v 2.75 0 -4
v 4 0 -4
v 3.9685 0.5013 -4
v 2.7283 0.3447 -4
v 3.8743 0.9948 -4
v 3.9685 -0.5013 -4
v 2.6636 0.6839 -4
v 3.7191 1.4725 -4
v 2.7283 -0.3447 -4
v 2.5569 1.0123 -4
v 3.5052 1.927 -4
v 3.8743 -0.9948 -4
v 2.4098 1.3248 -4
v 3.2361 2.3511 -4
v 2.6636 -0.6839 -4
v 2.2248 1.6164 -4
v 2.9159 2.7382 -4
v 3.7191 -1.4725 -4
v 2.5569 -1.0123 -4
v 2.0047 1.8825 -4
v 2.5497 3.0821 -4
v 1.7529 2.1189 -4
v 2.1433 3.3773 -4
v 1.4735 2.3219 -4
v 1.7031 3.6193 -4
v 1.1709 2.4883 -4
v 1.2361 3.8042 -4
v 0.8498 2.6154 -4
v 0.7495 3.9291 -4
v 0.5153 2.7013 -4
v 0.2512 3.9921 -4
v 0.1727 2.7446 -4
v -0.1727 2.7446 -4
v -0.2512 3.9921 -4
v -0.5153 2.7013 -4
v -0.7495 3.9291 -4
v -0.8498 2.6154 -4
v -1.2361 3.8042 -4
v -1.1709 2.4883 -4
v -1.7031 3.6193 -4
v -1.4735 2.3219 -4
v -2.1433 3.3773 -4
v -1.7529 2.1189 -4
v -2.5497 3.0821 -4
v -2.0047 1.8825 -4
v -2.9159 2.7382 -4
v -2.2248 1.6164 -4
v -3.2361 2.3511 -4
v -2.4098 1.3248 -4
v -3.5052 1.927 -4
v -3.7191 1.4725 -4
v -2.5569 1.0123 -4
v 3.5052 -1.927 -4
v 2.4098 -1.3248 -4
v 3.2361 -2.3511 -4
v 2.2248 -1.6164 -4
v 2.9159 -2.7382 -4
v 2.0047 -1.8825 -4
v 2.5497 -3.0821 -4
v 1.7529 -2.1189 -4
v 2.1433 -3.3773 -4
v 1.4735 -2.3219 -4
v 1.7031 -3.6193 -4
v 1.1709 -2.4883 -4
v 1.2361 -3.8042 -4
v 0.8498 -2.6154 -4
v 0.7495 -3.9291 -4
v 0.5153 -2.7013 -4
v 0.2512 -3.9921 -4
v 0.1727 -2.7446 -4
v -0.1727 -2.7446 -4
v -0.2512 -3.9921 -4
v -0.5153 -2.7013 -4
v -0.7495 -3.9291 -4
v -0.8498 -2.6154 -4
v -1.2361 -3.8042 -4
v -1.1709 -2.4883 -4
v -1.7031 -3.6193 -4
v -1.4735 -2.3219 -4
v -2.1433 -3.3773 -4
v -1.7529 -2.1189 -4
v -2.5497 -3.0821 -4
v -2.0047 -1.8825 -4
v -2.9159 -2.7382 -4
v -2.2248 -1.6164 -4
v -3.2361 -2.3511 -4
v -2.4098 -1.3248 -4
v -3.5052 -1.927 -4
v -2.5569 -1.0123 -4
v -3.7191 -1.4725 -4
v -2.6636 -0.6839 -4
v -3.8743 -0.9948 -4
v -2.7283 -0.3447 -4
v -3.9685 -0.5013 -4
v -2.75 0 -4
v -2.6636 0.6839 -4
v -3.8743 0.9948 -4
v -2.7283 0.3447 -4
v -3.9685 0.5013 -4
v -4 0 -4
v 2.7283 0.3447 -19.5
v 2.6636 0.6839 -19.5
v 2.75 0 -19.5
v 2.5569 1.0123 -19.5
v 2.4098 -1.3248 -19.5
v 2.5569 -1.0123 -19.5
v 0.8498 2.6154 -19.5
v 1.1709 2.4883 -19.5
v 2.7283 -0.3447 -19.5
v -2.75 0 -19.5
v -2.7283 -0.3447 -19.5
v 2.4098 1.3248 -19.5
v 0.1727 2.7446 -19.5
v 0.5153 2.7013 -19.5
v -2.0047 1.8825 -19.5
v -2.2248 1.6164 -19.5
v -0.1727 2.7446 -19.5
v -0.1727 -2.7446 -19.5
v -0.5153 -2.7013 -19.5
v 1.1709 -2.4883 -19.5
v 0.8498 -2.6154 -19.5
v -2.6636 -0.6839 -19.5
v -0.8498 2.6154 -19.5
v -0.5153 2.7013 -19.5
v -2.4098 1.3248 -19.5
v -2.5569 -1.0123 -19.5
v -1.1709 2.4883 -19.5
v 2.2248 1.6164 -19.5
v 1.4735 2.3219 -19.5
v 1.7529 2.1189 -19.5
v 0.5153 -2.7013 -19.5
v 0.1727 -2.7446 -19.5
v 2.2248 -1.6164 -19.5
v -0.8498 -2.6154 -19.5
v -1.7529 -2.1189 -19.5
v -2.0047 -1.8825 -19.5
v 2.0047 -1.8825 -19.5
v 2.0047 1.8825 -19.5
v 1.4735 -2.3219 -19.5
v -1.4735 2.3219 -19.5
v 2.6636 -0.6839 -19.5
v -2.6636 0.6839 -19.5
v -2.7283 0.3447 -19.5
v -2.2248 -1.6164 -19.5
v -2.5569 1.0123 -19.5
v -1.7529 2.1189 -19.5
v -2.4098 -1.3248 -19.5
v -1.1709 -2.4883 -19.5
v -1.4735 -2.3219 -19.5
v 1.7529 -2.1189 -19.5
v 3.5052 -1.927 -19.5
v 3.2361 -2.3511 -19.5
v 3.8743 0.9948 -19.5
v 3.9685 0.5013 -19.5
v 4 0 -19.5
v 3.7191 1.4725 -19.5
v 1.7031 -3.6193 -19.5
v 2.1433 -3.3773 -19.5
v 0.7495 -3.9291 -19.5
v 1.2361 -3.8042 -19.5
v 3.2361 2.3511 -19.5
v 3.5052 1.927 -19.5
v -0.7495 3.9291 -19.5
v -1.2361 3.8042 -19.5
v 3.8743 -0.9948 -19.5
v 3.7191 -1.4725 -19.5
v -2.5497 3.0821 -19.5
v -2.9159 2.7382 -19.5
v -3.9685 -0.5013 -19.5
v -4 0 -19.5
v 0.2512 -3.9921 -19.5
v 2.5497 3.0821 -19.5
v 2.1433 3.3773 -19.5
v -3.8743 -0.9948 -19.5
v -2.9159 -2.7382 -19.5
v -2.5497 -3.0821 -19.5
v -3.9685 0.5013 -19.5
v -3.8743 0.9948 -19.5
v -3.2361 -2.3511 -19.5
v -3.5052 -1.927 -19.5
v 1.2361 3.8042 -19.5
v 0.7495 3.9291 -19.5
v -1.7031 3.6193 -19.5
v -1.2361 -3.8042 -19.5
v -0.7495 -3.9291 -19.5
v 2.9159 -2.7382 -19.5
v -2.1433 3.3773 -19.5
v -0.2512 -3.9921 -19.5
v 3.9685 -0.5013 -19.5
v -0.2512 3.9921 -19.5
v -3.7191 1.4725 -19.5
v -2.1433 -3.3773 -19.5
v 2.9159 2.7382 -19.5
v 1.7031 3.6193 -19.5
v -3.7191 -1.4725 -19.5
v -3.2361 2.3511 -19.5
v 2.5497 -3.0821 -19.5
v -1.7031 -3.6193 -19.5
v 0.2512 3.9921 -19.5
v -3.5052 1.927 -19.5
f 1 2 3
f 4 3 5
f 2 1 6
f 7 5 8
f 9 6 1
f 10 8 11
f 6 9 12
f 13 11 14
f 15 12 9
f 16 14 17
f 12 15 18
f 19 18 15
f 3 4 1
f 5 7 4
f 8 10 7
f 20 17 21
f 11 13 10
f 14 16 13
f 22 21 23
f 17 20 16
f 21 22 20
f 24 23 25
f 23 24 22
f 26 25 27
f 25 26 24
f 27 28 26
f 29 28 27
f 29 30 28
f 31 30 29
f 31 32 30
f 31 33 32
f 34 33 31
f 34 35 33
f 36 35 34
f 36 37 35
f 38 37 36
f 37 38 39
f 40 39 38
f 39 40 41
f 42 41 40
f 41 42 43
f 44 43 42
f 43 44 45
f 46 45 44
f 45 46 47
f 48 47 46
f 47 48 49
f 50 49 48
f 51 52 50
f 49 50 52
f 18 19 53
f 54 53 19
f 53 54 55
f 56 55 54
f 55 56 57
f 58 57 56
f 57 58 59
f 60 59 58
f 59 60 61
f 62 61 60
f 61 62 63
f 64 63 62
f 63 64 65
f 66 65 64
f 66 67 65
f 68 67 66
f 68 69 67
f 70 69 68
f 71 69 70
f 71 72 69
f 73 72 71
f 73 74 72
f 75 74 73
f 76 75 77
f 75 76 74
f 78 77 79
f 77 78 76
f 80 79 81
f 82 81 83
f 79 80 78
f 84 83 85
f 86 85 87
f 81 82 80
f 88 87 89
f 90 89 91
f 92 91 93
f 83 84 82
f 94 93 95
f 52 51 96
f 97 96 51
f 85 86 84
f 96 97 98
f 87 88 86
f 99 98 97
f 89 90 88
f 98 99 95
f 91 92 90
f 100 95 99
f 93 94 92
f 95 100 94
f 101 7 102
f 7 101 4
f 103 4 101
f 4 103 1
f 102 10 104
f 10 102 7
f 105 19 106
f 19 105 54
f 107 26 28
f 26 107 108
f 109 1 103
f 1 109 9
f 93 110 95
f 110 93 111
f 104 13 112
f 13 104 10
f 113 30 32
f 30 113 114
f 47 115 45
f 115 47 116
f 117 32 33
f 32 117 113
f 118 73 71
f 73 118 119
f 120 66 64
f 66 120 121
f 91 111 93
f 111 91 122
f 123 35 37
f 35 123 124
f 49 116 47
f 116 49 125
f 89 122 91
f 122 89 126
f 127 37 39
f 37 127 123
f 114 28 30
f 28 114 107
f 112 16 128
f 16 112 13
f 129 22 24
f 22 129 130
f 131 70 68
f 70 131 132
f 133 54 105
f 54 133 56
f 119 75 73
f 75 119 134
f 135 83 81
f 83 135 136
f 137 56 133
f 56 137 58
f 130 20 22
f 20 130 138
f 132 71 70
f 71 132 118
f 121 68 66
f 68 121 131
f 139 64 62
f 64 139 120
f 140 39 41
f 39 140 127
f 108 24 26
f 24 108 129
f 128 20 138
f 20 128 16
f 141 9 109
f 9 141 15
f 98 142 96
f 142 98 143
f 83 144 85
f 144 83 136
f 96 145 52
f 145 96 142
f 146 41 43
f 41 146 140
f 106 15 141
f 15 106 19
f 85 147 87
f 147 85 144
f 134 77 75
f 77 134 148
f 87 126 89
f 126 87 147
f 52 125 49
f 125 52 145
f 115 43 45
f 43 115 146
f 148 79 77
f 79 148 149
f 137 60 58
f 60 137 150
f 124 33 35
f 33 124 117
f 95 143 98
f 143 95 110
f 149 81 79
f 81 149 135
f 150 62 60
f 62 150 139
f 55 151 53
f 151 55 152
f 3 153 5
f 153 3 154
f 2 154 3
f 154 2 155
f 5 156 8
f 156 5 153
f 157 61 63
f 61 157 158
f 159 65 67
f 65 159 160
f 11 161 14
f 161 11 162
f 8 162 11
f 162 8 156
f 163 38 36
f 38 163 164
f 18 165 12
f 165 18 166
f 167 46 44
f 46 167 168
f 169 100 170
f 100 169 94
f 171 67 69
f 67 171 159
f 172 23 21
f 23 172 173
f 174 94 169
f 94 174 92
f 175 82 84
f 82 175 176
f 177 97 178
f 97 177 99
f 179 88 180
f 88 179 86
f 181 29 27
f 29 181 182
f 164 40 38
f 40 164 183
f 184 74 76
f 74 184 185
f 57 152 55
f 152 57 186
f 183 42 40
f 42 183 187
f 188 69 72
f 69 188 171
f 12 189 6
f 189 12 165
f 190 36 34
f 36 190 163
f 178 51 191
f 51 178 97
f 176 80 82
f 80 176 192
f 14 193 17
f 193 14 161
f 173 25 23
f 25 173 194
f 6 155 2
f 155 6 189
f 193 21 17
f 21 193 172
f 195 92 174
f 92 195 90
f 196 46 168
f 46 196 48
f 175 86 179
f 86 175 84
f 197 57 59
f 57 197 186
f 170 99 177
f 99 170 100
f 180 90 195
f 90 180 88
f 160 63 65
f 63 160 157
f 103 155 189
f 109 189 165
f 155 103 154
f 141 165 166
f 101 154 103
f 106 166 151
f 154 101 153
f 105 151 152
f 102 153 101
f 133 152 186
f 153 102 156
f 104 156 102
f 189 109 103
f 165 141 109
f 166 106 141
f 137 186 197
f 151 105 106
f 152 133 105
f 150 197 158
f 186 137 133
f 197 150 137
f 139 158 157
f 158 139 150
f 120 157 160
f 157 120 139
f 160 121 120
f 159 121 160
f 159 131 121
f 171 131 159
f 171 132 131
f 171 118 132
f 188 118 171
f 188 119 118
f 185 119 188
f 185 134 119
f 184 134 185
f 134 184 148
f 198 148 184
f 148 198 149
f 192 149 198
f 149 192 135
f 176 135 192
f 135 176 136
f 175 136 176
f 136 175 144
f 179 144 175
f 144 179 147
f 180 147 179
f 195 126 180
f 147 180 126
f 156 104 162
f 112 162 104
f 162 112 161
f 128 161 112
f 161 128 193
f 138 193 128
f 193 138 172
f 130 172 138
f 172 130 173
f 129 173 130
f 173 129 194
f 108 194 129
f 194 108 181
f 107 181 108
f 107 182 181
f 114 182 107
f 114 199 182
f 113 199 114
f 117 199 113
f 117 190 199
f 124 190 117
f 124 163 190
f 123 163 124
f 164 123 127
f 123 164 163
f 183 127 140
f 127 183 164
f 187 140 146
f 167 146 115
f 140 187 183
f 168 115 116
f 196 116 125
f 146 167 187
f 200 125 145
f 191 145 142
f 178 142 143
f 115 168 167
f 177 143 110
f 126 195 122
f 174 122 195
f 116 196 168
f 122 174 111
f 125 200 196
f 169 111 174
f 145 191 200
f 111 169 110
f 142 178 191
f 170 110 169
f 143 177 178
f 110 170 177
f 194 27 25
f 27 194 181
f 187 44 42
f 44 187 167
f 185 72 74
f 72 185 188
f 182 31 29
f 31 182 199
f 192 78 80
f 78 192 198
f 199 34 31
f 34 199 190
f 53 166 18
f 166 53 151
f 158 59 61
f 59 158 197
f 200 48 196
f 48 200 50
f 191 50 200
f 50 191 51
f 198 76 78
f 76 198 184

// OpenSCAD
$fn = 50;

difference() {
	union() {
		translate(v = [0, 0, -19.5]) {
			cylinder(h = 19.5, r = 4.0);
		}
	}
	union() {
		translate(v = [0, 0, 0]) {
			rotate(a = [0, 0, 0]) {
				difference() {
					union() {
						translate(v = [0, 0, -4]) {
							linear_extrude(height = 4) {
								polygon(points = [[4.8468, 0.0], [2.4234000000000004, 4.197451927062417], [-2.423399999999999, 4.197451927062417], [-4.8468, 5.935618106107392e-16], [-2.423400000000002, -4.197451927062416], [2.423399999999997, -4.197451927062419]]);
							}
						}
					}
					union();
				}
			}
		}
		#translate(v = [0, 0, -100.0]) {
			cylinder(h = 200, r = 2.75);
		}
	}
}
